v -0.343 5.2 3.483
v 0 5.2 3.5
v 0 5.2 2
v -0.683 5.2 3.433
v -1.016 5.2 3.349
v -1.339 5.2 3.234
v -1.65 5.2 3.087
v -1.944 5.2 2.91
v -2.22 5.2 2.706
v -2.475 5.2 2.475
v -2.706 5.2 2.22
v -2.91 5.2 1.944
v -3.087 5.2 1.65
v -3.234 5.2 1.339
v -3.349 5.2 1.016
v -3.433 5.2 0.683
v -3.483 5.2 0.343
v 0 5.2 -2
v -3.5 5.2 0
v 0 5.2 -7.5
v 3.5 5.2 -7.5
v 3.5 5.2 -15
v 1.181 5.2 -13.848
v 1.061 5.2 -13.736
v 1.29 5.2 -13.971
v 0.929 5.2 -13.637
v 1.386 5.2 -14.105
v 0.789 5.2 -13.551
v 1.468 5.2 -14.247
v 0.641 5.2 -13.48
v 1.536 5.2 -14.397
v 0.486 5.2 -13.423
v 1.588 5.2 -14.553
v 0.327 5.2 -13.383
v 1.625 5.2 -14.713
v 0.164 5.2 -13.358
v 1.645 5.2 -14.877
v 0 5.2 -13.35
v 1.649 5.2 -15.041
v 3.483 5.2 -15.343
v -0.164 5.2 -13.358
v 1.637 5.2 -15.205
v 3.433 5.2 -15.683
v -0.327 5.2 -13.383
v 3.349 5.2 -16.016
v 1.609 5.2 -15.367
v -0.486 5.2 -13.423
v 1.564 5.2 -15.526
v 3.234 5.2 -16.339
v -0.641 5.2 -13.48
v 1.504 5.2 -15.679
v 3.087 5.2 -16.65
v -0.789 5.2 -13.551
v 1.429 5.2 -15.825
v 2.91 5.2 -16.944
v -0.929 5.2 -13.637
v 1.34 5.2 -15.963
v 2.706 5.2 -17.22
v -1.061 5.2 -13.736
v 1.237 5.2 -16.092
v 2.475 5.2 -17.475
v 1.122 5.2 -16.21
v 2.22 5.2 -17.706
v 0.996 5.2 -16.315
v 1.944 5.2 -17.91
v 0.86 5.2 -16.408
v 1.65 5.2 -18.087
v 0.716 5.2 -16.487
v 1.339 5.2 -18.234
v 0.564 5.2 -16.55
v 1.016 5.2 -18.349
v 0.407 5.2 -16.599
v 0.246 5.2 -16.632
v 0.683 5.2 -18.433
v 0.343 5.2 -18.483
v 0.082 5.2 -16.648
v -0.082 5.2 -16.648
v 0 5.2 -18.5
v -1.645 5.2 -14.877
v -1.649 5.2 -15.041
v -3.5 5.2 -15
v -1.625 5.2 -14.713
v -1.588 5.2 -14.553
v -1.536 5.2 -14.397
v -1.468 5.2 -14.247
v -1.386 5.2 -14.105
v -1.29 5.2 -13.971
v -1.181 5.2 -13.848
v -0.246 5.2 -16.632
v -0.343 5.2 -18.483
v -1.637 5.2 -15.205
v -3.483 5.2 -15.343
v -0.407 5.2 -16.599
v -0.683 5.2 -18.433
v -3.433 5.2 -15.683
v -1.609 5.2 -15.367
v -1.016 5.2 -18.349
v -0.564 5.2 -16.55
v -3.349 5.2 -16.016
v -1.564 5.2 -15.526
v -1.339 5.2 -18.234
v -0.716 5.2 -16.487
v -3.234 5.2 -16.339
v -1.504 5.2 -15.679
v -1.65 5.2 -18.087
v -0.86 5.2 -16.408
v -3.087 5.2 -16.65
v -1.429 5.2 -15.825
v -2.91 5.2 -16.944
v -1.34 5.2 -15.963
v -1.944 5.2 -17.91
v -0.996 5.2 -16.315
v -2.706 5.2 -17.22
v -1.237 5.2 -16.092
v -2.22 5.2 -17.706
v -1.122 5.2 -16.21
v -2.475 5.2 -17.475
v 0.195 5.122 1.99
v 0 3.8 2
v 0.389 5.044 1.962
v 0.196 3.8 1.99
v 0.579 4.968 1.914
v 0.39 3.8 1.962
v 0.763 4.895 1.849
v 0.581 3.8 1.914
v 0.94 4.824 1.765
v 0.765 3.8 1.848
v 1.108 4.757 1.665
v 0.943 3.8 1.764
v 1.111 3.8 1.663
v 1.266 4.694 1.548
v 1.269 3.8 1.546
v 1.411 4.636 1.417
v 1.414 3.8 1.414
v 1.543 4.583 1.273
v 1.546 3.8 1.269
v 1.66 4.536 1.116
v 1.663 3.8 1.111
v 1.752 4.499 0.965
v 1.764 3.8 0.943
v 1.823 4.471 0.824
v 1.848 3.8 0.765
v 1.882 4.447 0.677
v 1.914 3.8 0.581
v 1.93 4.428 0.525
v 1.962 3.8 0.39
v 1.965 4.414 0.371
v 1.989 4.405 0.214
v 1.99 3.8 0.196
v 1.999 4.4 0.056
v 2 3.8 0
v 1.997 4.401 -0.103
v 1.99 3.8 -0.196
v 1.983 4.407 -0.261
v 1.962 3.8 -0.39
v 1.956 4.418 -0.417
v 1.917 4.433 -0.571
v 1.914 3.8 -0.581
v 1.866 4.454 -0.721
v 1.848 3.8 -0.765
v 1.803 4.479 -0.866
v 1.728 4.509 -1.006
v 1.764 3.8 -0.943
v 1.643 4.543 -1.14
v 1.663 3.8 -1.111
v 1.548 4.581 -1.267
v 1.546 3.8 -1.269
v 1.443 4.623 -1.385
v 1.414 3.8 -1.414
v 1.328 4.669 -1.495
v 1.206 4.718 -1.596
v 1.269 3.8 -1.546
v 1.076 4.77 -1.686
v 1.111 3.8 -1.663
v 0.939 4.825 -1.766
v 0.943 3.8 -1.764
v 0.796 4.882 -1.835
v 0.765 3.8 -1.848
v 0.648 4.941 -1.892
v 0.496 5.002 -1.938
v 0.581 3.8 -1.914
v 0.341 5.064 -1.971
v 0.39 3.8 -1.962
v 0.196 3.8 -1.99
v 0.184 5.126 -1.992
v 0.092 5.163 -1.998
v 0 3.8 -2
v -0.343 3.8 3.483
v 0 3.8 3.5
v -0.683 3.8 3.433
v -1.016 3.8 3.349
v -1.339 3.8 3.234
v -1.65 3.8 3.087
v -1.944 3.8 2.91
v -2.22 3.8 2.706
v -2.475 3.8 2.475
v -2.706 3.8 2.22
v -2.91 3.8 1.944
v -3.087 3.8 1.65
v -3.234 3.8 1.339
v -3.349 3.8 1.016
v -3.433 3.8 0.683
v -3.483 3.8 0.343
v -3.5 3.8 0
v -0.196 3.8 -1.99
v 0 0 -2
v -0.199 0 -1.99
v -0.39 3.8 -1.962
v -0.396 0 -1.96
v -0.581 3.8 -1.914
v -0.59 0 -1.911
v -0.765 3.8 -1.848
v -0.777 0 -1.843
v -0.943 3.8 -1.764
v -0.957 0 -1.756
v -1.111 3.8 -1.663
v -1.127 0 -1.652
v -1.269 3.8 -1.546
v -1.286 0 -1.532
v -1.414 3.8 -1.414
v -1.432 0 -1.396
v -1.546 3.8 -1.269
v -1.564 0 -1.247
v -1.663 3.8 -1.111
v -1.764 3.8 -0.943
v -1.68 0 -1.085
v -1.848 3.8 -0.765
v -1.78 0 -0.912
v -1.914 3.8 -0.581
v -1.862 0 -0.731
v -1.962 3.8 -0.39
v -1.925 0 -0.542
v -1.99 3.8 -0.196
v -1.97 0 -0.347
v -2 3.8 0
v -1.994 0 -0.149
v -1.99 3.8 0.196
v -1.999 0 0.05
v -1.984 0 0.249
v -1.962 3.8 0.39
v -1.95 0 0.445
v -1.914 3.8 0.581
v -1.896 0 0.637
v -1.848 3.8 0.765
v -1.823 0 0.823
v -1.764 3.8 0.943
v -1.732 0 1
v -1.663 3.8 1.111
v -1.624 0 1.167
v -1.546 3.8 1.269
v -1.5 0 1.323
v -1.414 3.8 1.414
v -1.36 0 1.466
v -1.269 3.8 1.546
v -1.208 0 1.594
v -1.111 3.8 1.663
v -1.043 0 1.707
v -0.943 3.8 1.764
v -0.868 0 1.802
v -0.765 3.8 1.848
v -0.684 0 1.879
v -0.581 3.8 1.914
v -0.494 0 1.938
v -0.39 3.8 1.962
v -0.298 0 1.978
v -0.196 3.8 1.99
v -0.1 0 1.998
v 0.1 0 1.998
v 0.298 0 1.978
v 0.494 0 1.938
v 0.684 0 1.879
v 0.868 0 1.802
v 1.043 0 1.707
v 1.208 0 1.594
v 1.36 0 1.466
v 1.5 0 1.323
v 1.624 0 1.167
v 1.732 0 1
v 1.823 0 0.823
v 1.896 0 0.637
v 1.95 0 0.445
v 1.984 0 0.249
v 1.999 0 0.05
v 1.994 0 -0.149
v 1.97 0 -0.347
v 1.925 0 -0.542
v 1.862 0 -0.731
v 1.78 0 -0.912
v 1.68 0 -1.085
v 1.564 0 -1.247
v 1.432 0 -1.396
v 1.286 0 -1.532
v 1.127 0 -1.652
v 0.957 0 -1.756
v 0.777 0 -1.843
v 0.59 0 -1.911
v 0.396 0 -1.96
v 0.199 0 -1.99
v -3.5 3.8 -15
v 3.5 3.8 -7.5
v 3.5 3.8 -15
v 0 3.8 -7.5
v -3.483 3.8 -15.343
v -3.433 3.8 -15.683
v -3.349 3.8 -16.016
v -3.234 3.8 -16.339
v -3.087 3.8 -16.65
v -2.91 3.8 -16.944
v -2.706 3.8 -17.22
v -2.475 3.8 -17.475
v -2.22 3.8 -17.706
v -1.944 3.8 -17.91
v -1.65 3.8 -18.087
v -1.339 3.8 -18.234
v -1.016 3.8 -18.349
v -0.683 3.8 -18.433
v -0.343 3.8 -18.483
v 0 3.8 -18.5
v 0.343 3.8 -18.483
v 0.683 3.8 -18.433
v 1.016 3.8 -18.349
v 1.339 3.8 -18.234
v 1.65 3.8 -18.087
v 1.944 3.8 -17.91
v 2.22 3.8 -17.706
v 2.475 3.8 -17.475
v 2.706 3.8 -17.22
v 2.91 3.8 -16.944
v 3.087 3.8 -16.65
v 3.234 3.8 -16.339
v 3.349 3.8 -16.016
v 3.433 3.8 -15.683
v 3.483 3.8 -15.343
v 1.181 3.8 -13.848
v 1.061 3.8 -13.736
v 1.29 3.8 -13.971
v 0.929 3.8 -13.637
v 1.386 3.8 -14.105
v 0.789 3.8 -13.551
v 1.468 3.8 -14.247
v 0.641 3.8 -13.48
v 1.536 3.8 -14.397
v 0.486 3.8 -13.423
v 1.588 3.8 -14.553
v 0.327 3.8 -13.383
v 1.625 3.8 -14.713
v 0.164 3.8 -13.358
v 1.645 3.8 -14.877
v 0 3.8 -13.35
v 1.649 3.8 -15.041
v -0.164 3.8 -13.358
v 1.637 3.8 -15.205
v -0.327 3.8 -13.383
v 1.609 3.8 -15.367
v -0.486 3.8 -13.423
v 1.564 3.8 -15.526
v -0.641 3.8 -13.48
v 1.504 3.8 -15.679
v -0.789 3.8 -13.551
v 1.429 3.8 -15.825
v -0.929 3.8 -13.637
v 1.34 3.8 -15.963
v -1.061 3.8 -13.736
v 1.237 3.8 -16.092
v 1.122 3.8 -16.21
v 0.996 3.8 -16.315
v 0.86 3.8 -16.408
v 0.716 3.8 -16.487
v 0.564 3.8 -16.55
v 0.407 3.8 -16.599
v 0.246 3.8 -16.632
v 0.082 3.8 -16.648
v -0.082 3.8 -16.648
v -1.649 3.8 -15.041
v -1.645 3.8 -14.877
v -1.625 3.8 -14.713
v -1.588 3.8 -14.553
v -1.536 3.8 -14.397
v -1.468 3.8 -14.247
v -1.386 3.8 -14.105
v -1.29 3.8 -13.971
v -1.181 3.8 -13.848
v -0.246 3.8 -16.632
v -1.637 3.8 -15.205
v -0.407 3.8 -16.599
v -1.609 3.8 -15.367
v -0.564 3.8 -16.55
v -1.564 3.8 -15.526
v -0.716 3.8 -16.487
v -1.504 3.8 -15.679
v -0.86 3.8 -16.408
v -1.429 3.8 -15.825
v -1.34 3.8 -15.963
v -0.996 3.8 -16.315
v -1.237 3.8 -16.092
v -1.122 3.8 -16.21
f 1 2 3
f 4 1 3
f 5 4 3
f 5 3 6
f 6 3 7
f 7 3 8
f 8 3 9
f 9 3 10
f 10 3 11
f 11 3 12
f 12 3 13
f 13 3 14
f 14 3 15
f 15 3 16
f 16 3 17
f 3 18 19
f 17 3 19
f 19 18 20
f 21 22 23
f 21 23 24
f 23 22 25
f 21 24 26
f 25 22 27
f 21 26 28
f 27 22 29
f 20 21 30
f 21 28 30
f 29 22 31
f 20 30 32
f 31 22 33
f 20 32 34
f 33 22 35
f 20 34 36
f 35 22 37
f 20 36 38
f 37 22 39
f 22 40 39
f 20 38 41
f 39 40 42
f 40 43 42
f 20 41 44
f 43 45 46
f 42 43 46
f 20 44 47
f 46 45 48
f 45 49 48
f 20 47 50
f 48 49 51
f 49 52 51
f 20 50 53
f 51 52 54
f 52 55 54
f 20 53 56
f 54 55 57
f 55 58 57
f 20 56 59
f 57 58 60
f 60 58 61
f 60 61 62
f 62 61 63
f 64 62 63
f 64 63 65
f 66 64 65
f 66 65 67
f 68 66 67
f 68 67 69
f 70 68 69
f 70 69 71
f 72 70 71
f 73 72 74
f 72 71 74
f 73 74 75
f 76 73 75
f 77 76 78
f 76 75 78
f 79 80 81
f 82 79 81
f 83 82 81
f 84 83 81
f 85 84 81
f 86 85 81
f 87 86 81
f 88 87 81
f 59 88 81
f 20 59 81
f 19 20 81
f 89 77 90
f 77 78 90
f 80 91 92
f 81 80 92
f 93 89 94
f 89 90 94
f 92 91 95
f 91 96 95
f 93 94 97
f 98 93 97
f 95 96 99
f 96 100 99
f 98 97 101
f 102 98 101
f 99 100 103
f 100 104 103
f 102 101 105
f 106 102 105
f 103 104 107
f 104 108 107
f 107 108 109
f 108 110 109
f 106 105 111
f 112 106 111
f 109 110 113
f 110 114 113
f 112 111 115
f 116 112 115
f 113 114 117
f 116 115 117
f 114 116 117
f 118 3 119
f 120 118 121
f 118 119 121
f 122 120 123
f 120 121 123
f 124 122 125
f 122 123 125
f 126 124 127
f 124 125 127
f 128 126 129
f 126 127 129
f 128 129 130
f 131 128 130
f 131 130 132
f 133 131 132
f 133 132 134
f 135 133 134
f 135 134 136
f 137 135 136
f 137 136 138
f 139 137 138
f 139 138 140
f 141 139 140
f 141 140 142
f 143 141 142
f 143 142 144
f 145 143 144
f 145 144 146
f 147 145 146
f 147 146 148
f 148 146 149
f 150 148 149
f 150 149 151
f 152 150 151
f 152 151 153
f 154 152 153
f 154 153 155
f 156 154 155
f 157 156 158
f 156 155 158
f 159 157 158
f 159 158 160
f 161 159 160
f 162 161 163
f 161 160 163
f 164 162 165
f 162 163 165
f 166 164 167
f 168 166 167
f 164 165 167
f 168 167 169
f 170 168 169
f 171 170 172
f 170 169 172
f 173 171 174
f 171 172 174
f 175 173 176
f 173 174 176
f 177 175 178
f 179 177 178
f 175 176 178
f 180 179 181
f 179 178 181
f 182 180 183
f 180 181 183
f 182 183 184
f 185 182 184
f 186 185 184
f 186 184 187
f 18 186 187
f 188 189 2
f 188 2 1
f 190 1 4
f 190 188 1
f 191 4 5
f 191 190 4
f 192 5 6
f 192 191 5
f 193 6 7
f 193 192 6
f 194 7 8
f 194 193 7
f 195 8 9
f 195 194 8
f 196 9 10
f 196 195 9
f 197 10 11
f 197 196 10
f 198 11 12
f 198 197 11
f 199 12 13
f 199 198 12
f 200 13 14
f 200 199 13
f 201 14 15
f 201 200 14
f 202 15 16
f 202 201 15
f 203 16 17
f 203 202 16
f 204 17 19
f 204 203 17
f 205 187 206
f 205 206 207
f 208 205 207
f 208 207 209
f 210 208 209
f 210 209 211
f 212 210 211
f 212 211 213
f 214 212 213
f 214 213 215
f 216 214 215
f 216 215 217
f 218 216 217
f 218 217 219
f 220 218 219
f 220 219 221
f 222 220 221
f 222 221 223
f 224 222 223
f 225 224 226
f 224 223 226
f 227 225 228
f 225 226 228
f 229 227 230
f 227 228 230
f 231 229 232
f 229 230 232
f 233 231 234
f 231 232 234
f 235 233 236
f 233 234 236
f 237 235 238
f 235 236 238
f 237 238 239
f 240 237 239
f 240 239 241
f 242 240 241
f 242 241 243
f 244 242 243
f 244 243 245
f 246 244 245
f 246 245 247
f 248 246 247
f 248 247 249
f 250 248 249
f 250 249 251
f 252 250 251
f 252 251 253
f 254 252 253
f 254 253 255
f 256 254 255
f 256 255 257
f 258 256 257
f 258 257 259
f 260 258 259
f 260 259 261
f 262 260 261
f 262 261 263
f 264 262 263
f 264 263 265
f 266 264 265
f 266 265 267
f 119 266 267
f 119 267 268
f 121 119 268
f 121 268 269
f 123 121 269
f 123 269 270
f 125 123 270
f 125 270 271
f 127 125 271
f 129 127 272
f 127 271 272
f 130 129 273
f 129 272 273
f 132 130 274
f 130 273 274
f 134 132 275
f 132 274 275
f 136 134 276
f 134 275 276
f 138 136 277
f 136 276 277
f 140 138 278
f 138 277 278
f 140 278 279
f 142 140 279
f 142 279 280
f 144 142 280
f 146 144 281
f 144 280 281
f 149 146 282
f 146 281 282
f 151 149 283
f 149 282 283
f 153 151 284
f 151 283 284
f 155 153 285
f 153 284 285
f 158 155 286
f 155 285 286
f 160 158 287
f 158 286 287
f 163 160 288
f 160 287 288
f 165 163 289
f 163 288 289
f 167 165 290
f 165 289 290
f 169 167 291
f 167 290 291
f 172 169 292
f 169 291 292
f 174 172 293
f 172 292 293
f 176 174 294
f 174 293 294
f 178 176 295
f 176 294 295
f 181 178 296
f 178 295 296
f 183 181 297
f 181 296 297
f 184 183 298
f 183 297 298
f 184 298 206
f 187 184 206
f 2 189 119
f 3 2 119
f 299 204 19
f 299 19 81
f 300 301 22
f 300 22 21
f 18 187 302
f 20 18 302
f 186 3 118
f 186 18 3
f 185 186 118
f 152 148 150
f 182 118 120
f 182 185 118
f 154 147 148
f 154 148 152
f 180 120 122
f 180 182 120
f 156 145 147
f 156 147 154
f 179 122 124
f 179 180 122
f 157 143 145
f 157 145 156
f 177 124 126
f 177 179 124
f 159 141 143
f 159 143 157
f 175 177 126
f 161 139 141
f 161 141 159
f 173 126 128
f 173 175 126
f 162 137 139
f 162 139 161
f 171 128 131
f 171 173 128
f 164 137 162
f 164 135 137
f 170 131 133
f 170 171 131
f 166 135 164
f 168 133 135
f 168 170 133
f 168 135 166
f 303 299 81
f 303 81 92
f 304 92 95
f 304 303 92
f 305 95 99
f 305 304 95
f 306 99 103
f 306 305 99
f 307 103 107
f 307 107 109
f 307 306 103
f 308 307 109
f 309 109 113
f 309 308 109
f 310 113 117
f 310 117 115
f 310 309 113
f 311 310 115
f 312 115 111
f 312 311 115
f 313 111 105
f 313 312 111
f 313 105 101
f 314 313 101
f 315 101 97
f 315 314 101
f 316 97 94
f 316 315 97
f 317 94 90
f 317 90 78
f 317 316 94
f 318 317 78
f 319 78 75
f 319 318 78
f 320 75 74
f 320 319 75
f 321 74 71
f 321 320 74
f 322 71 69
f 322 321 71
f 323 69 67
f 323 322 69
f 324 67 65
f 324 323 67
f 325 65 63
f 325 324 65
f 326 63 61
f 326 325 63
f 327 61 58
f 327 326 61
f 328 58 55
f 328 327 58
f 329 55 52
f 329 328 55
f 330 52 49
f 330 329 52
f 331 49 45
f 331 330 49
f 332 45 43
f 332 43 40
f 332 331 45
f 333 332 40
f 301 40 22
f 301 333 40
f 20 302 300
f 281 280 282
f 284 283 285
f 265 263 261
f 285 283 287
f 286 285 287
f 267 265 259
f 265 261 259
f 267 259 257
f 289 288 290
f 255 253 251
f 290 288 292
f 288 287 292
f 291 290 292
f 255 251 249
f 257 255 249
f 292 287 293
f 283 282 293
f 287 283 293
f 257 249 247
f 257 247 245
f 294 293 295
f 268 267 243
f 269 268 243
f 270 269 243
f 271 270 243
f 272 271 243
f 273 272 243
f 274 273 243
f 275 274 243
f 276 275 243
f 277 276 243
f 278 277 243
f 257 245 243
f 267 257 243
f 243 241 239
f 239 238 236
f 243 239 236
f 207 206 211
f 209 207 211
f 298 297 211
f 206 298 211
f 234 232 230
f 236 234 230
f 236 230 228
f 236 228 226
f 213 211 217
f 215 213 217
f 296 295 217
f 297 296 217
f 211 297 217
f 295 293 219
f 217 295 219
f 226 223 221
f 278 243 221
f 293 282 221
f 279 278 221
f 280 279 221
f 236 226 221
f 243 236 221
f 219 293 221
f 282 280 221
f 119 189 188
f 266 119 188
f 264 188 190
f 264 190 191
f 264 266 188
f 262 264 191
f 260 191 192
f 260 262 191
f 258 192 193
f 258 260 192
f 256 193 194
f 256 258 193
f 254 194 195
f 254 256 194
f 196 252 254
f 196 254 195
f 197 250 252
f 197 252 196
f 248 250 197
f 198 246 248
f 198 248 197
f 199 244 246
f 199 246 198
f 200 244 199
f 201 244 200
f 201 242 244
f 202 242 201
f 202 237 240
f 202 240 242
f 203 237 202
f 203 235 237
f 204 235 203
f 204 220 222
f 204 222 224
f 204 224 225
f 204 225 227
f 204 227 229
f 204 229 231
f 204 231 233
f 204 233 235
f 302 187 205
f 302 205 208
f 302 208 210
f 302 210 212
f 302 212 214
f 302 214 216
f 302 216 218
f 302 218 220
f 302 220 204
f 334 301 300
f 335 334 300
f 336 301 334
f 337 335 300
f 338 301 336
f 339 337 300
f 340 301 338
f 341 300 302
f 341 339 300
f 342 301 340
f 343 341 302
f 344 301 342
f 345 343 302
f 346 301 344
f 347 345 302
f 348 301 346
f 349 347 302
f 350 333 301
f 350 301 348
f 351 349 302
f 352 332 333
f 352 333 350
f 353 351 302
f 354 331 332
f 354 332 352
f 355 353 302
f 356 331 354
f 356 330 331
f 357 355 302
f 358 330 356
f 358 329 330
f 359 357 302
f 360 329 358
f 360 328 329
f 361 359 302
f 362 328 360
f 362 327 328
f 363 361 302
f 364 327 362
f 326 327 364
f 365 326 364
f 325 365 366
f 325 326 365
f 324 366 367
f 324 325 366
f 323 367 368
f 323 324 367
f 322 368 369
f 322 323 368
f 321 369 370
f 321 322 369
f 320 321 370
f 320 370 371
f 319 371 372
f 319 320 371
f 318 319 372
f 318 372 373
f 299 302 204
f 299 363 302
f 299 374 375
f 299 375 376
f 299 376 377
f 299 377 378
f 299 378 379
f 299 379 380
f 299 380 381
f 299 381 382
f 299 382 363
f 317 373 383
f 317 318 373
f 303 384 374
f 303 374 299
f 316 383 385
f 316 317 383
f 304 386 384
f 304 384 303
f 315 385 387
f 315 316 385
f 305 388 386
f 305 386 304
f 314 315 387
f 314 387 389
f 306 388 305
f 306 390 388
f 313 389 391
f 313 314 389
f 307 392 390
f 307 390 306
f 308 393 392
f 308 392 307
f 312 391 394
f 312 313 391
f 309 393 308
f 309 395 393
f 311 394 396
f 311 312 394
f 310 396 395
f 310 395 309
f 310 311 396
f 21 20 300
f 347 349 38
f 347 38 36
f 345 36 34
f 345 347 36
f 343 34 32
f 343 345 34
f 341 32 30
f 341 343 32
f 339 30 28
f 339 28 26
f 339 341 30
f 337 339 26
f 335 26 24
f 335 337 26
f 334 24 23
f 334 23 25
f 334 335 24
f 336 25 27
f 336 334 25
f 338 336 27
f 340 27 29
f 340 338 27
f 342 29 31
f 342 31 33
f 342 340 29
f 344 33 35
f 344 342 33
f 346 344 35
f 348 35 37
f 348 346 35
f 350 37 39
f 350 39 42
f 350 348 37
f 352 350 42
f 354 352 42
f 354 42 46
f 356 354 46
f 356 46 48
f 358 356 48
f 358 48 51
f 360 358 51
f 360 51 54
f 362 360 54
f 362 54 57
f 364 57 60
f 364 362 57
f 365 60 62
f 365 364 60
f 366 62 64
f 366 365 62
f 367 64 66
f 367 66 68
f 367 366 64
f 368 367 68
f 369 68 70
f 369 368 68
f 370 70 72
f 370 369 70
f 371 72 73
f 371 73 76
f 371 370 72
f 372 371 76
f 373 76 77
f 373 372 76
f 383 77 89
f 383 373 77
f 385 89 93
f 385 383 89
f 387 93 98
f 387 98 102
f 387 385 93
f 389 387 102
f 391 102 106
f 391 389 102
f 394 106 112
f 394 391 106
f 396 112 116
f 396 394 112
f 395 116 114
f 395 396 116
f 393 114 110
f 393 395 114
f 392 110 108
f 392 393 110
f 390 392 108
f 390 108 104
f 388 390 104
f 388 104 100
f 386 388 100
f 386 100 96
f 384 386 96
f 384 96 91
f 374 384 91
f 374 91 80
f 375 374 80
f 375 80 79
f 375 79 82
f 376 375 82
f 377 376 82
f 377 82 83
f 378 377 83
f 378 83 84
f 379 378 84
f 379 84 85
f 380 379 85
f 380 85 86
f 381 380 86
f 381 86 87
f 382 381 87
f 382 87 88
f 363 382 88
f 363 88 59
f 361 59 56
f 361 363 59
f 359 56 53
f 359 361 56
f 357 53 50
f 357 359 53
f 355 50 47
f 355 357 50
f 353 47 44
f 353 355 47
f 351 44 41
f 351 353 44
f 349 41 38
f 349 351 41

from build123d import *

# Parameters (mm, degrees)
SKETCH_1_R          = 2
EXTRUDE_1_DEPTH     = 3.8
SKETCH_2_R          = 1.65
EXTRUDE_2_DEPTH     = 1.4
CUT_EXTRUDE_1_DEPTH = 20.207810911
CUT_EXTRUDE_2_DEPTH = 13.660568708


with BuildPart() as part:
    # 草图1 → 凸台-拉伸1 (new body)
    with BuildSketch(Plane(origin=(0, 0, 0), x_dir=(1, 0, 0), z_dir=(0, 1, 0))):
        with Locations(Location((0, 0, 0), (0, 0, 90))):
            Circle(SKETCH_1_R)
    extrude(amount=EXTRUDE_1_DEPTH)

    # 草图2 → 凸台-拉伸2 (add)
    with BuildSketch(Plane(origin=(0, 3.8, 0), x_dir=(1, 0, 0), z_dir=(0, 1, 0))):
        with BuildLine():
            Line((-3.5, 0), (-3.5, 15))
            ThreePointArc((-3.5, 15), (0, 18.5), (3.5, 15))
            Line((3.5, 15), (3.5, 0))
            ThreePointArc((3.5, 0), (0, -3.5), (-3.5, 0))
        make_face()
        with Locations(Location((0, 15, 0), (0, 0, 270))):
            Circle(SKETCH_2_R, mode=Mode.SUBTRACT)
    extrude(amount=EXTRUDE_2_DEPTH)

    # 草图3 → 切除-拉伸1 (cut, through all)
    with BuildSketch(Plane.XZ.offset(-3.8)):
        with BuildLine():
            Line((0, 3.5), (0, 2))
            ThreePointArc((0, 2), (2, 0), (0, -2))
            Line((0, -2), (0, -7.5))
            Line((0, -7.5), (3.5, -7.5))
            Line((3.5, -7.5), (3.5, 0))
            ThreePointArc((3.5, 0), (2.474873734, 2.474873734), (0, 3.5))
        make_face()
    extrude(amount=-CUT_EXTRUDE_1_DEPTH, mode=Mode.SUBTRACT)

    # 草图4 → 切除-拉伸2 (cut, through all)
    with BuildSketch(Plane.XY.offset(-7.5)):
        Polygon((0, 5.2), (3.5, 3.8), (3.5, 5.2), align=None)
    extrude(amount=CUT_EXTRUDE_2_DEPTH, mode=Mode.SUBTRACT)


solid = part.part
